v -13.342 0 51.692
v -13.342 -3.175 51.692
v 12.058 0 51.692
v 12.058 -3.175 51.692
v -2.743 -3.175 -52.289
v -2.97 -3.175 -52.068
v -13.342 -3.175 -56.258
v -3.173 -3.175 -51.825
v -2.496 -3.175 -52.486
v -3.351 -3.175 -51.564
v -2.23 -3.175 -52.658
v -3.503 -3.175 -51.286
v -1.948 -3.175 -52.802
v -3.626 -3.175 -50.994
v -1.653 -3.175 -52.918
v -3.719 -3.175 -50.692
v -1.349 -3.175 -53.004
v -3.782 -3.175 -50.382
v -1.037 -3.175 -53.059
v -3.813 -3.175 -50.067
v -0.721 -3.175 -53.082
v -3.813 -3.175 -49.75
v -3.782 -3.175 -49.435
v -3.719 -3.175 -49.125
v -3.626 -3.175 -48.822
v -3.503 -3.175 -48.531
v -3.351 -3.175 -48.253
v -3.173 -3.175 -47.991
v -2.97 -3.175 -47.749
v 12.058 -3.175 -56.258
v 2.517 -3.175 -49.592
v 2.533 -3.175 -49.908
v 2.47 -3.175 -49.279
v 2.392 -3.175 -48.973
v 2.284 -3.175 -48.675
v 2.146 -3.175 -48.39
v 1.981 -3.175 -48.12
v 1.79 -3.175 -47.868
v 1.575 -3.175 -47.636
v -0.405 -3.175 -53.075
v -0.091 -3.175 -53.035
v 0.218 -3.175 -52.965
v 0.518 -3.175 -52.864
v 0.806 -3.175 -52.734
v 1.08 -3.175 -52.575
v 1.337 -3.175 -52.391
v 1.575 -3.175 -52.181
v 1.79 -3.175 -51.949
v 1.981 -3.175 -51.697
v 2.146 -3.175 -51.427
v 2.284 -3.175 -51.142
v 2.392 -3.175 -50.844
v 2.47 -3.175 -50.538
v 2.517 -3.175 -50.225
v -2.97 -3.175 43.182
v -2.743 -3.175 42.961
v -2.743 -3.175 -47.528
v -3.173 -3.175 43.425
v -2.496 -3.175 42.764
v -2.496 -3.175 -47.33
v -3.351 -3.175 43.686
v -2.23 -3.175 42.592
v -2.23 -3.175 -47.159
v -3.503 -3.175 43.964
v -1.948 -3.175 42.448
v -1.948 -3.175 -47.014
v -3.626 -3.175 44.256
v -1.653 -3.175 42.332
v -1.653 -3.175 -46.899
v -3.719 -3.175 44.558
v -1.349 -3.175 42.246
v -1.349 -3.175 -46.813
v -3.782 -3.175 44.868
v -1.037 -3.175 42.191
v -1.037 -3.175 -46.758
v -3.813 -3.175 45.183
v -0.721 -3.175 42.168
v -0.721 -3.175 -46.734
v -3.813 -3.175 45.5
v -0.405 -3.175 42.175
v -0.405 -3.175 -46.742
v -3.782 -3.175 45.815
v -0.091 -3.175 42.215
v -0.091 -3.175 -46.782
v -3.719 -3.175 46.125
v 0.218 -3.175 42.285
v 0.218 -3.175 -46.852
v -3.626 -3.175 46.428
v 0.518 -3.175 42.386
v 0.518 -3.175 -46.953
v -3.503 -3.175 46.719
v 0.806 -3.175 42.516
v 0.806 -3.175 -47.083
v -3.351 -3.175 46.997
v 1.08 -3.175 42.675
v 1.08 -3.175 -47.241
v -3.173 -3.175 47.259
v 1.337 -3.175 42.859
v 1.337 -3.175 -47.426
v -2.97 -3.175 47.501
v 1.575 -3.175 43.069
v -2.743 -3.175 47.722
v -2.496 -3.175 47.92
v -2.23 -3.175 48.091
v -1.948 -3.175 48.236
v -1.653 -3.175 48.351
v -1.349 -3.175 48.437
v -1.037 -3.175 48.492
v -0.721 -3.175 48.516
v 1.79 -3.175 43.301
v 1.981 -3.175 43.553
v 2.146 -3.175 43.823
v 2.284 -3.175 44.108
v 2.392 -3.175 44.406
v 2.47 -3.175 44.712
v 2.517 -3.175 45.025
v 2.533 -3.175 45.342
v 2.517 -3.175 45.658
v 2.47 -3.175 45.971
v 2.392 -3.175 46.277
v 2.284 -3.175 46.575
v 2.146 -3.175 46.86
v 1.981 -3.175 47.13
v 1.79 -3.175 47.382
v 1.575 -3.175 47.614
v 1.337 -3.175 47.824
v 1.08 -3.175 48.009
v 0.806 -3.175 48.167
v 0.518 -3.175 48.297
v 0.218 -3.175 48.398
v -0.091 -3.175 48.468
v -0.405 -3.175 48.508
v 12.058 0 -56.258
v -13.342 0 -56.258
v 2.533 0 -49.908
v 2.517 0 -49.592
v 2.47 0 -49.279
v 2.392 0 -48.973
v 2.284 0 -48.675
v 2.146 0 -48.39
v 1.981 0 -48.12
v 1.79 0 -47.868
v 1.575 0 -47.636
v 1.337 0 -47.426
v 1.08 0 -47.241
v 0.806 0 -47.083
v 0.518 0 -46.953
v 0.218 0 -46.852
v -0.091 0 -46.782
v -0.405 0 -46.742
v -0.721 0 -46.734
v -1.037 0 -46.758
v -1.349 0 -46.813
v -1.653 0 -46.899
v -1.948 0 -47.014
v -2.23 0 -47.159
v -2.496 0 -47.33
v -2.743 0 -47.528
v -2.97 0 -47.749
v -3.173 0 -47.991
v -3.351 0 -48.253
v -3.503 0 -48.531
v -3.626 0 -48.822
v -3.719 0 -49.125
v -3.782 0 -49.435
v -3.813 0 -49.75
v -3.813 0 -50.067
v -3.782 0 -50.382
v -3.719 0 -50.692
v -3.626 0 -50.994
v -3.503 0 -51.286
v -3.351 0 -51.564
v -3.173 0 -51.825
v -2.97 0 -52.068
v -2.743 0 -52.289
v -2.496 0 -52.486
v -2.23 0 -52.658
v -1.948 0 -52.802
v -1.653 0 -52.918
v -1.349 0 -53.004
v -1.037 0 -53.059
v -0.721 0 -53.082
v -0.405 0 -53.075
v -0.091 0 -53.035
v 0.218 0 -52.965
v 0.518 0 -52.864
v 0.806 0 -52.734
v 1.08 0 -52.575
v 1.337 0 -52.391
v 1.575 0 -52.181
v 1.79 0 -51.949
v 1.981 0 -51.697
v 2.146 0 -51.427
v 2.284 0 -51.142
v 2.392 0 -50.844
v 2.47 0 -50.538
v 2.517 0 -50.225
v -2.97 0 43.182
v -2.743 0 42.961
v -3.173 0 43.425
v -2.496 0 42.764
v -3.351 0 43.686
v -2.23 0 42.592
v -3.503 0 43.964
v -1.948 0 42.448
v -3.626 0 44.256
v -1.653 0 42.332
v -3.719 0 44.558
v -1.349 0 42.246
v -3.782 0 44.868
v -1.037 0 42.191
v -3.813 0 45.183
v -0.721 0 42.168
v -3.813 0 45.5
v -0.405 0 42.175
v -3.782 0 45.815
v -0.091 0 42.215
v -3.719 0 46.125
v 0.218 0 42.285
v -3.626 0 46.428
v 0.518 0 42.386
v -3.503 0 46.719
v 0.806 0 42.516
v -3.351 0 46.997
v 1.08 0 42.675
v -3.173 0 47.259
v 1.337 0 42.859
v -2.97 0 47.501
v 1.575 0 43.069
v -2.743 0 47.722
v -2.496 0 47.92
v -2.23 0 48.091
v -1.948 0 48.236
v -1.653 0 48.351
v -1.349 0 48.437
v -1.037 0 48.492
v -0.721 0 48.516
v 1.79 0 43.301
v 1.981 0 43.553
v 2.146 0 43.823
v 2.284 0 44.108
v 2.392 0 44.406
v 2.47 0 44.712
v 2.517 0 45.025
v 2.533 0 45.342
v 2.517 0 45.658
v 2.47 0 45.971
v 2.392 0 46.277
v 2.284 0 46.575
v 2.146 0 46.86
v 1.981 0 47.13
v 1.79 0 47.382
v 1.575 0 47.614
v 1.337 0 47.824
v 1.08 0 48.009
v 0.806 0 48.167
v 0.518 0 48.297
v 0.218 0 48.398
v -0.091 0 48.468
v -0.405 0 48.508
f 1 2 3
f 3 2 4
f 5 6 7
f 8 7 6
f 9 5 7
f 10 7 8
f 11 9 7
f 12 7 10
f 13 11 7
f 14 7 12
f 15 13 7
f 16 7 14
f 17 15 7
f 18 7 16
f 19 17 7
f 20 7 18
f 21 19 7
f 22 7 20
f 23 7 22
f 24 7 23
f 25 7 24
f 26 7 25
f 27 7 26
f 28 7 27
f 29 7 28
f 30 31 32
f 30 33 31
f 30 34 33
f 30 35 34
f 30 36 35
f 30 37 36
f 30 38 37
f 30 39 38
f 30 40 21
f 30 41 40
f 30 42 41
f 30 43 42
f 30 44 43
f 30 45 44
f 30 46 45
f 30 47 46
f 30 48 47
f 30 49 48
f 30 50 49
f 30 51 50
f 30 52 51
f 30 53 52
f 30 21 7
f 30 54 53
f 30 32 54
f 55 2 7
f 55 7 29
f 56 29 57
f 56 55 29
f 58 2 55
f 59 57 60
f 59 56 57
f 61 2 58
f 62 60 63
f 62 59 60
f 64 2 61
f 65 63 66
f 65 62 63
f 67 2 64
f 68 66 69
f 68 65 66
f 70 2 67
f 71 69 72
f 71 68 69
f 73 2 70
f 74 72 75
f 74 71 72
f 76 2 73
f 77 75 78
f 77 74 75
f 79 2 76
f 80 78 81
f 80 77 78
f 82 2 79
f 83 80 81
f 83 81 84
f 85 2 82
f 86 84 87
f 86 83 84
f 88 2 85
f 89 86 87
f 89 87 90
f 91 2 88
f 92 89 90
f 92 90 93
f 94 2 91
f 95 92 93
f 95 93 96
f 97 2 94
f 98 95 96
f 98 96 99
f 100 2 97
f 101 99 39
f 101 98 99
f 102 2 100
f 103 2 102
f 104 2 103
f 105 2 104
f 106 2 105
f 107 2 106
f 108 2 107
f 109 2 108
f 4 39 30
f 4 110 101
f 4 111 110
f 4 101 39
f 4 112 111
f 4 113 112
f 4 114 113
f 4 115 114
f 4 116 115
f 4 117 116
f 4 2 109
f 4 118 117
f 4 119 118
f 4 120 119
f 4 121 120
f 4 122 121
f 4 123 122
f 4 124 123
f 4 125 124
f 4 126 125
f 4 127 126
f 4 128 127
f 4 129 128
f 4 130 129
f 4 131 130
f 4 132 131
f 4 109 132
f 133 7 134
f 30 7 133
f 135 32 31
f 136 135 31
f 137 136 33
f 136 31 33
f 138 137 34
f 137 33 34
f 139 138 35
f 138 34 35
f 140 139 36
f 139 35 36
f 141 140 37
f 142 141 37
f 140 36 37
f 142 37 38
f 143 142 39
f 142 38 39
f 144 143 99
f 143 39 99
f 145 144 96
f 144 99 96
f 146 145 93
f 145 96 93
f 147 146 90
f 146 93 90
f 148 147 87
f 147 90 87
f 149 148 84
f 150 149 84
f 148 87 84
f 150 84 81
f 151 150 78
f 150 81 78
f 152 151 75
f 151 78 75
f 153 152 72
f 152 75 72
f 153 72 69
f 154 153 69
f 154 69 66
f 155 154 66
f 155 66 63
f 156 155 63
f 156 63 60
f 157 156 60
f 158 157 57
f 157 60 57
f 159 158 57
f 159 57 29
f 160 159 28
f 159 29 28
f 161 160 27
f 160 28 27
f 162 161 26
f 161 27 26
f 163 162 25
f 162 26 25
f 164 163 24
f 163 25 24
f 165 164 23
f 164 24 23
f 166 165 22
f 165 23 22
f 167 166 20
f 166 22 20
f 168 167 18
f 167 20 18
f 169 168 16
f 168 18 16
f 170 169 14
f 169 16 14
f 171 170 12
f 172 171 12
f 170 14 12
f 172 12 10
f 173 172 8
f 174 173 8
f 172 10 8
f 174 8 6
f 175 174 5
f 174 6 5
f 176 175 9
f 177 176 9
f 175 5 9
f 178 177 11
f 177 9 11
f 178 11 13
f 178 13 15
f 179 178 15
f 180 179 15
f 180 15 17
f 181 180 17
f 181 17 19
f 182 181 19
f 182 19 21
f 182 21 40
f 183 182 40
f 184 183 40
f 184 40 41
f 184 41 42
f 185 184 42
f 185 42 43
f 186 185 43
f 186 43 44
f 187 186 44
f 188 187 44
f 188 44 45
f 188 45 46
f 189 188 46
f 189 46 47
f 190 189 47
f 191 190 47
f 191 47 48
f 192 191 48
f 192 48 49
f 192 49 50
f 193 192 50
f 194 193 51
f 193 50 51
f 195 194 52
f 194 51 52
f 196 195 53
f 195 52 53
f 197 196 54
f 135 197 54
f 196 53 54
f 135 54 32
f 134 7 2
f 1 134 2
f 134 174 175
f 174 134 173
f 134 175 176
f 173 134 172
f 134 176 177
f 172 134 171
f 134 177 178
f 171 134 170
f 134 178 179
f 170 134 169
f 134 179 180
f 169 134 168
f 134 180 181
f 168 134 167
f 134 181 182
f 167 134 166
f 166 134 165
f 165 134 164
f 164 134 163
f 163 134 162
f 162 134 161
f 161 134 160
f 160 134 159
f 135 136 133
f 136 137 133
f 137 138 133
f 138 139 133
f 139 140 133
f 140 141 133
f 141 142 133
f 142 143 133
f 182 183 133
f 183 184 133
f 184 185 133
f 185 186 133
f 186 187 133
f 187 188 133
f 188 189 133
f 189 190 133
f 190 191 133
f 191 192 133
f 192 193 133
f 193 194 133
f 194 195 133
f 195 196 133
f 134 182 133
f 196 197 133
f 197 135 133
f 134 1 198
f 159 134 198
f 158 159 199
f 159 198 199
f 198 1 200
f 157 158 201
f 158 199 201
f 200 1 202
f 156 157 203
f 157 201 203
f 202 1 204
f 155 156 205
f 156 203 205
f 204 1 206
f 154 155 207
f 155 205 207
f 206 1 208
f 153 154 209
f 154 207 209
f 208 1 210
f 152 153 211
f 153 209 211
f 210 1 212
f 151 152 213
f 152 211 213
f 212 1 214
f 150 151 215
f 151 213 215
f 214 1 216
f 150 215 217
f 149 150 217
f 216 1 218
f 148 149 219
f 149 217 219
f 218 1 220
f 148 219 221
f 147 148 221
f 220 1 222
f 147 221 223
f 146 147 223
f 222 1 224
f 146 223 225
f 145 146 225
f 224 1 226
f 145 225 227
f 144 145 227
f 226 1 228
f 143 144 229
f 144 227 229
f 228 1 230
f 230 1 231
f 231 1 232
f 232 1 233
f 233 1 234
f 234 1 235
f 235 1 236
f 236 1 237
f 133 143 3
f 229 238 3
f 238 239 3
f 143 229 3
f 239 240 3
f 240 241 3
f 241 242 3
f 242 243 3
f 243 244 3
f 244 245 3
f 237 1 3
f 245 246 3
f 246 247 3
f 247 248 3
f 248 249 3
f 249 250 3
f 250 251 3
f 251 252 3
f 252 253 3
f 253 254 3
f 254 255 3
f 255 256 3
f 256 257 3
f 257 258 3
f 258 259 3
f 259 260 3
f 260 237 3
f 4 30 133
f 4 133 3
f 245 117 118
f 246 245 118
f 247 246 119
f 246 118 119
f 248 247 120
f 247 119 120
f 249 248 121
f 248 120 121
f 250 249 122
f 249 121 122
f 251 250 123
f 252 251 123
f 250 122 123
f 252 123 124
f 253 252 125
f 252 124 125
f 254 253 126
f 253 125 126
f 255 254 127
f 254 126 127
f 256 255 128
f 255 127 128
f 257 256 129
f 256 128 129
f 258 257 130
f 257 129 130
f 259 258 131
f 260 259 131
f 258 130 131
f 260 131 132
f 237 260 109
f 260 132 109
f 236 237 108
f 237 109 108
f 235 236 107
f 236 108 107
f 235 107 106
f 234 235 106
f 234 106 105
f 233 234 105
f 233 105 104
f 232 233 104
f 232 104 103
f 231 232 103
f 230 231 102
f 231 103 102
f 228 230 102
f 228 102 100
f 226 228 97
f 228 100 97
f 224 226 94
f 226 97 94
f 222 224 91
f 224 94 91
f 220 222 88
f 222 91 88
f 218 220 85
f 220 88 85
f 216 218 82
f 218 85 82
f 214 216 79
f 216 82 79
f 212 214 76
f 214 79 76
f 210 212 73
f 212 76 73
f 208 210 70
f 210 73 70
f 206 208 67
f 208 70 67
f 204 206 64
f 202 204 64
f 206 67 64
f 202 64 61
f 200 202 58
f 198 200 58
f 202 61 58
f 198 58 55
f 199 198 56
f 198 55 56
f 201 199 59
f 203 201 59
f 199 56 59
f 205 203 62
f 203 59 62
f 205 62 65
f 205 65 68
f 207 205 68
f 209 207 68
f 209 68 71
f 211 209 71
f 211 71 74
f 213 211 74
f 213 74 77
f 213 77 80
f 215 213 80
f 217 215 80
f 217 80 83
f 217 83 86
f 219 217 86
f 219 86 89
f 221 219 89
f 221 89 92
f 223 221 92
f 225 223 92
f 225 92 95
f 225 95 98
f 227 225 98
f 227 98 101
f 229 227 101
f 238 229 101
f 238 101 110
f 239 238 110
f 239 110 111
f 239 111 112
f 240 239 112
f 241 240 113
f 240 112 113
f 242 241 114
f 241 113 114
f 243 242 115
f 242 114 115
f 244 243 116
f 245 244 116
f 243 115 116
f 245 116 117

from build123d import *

# Parameters (mm, degrees)
SKETCH1_W           = 25.4
SKETCH1_H           = 107.95
SKETCH1_R           = 3.175
BOSS_EXTRUDE1_DEPTH = 3.175


with BuildPart() as part:
    # Sketch1 → Boss-Extrude1 (new body)
    with BuildSketch(Plane.XZ.offset(3.175)):
        with Locations((-0.642134808, -2.283393272)):
            Rectangle(SKETCH1_W, SKETCH1_H)
        with Locations((-0.642134808, -49.908393272)):
            Circle(SKETCH1_R, mode=Mode.SUBTRACT)
        with Locations((-0.642134808, 45.341606728)):
            Circle(SKETCH1_R, mode=Mode.SUBTRACT)
    extrude(amount=-BOSS_EXTRUDE1_DEPTH)


solid = part.part
